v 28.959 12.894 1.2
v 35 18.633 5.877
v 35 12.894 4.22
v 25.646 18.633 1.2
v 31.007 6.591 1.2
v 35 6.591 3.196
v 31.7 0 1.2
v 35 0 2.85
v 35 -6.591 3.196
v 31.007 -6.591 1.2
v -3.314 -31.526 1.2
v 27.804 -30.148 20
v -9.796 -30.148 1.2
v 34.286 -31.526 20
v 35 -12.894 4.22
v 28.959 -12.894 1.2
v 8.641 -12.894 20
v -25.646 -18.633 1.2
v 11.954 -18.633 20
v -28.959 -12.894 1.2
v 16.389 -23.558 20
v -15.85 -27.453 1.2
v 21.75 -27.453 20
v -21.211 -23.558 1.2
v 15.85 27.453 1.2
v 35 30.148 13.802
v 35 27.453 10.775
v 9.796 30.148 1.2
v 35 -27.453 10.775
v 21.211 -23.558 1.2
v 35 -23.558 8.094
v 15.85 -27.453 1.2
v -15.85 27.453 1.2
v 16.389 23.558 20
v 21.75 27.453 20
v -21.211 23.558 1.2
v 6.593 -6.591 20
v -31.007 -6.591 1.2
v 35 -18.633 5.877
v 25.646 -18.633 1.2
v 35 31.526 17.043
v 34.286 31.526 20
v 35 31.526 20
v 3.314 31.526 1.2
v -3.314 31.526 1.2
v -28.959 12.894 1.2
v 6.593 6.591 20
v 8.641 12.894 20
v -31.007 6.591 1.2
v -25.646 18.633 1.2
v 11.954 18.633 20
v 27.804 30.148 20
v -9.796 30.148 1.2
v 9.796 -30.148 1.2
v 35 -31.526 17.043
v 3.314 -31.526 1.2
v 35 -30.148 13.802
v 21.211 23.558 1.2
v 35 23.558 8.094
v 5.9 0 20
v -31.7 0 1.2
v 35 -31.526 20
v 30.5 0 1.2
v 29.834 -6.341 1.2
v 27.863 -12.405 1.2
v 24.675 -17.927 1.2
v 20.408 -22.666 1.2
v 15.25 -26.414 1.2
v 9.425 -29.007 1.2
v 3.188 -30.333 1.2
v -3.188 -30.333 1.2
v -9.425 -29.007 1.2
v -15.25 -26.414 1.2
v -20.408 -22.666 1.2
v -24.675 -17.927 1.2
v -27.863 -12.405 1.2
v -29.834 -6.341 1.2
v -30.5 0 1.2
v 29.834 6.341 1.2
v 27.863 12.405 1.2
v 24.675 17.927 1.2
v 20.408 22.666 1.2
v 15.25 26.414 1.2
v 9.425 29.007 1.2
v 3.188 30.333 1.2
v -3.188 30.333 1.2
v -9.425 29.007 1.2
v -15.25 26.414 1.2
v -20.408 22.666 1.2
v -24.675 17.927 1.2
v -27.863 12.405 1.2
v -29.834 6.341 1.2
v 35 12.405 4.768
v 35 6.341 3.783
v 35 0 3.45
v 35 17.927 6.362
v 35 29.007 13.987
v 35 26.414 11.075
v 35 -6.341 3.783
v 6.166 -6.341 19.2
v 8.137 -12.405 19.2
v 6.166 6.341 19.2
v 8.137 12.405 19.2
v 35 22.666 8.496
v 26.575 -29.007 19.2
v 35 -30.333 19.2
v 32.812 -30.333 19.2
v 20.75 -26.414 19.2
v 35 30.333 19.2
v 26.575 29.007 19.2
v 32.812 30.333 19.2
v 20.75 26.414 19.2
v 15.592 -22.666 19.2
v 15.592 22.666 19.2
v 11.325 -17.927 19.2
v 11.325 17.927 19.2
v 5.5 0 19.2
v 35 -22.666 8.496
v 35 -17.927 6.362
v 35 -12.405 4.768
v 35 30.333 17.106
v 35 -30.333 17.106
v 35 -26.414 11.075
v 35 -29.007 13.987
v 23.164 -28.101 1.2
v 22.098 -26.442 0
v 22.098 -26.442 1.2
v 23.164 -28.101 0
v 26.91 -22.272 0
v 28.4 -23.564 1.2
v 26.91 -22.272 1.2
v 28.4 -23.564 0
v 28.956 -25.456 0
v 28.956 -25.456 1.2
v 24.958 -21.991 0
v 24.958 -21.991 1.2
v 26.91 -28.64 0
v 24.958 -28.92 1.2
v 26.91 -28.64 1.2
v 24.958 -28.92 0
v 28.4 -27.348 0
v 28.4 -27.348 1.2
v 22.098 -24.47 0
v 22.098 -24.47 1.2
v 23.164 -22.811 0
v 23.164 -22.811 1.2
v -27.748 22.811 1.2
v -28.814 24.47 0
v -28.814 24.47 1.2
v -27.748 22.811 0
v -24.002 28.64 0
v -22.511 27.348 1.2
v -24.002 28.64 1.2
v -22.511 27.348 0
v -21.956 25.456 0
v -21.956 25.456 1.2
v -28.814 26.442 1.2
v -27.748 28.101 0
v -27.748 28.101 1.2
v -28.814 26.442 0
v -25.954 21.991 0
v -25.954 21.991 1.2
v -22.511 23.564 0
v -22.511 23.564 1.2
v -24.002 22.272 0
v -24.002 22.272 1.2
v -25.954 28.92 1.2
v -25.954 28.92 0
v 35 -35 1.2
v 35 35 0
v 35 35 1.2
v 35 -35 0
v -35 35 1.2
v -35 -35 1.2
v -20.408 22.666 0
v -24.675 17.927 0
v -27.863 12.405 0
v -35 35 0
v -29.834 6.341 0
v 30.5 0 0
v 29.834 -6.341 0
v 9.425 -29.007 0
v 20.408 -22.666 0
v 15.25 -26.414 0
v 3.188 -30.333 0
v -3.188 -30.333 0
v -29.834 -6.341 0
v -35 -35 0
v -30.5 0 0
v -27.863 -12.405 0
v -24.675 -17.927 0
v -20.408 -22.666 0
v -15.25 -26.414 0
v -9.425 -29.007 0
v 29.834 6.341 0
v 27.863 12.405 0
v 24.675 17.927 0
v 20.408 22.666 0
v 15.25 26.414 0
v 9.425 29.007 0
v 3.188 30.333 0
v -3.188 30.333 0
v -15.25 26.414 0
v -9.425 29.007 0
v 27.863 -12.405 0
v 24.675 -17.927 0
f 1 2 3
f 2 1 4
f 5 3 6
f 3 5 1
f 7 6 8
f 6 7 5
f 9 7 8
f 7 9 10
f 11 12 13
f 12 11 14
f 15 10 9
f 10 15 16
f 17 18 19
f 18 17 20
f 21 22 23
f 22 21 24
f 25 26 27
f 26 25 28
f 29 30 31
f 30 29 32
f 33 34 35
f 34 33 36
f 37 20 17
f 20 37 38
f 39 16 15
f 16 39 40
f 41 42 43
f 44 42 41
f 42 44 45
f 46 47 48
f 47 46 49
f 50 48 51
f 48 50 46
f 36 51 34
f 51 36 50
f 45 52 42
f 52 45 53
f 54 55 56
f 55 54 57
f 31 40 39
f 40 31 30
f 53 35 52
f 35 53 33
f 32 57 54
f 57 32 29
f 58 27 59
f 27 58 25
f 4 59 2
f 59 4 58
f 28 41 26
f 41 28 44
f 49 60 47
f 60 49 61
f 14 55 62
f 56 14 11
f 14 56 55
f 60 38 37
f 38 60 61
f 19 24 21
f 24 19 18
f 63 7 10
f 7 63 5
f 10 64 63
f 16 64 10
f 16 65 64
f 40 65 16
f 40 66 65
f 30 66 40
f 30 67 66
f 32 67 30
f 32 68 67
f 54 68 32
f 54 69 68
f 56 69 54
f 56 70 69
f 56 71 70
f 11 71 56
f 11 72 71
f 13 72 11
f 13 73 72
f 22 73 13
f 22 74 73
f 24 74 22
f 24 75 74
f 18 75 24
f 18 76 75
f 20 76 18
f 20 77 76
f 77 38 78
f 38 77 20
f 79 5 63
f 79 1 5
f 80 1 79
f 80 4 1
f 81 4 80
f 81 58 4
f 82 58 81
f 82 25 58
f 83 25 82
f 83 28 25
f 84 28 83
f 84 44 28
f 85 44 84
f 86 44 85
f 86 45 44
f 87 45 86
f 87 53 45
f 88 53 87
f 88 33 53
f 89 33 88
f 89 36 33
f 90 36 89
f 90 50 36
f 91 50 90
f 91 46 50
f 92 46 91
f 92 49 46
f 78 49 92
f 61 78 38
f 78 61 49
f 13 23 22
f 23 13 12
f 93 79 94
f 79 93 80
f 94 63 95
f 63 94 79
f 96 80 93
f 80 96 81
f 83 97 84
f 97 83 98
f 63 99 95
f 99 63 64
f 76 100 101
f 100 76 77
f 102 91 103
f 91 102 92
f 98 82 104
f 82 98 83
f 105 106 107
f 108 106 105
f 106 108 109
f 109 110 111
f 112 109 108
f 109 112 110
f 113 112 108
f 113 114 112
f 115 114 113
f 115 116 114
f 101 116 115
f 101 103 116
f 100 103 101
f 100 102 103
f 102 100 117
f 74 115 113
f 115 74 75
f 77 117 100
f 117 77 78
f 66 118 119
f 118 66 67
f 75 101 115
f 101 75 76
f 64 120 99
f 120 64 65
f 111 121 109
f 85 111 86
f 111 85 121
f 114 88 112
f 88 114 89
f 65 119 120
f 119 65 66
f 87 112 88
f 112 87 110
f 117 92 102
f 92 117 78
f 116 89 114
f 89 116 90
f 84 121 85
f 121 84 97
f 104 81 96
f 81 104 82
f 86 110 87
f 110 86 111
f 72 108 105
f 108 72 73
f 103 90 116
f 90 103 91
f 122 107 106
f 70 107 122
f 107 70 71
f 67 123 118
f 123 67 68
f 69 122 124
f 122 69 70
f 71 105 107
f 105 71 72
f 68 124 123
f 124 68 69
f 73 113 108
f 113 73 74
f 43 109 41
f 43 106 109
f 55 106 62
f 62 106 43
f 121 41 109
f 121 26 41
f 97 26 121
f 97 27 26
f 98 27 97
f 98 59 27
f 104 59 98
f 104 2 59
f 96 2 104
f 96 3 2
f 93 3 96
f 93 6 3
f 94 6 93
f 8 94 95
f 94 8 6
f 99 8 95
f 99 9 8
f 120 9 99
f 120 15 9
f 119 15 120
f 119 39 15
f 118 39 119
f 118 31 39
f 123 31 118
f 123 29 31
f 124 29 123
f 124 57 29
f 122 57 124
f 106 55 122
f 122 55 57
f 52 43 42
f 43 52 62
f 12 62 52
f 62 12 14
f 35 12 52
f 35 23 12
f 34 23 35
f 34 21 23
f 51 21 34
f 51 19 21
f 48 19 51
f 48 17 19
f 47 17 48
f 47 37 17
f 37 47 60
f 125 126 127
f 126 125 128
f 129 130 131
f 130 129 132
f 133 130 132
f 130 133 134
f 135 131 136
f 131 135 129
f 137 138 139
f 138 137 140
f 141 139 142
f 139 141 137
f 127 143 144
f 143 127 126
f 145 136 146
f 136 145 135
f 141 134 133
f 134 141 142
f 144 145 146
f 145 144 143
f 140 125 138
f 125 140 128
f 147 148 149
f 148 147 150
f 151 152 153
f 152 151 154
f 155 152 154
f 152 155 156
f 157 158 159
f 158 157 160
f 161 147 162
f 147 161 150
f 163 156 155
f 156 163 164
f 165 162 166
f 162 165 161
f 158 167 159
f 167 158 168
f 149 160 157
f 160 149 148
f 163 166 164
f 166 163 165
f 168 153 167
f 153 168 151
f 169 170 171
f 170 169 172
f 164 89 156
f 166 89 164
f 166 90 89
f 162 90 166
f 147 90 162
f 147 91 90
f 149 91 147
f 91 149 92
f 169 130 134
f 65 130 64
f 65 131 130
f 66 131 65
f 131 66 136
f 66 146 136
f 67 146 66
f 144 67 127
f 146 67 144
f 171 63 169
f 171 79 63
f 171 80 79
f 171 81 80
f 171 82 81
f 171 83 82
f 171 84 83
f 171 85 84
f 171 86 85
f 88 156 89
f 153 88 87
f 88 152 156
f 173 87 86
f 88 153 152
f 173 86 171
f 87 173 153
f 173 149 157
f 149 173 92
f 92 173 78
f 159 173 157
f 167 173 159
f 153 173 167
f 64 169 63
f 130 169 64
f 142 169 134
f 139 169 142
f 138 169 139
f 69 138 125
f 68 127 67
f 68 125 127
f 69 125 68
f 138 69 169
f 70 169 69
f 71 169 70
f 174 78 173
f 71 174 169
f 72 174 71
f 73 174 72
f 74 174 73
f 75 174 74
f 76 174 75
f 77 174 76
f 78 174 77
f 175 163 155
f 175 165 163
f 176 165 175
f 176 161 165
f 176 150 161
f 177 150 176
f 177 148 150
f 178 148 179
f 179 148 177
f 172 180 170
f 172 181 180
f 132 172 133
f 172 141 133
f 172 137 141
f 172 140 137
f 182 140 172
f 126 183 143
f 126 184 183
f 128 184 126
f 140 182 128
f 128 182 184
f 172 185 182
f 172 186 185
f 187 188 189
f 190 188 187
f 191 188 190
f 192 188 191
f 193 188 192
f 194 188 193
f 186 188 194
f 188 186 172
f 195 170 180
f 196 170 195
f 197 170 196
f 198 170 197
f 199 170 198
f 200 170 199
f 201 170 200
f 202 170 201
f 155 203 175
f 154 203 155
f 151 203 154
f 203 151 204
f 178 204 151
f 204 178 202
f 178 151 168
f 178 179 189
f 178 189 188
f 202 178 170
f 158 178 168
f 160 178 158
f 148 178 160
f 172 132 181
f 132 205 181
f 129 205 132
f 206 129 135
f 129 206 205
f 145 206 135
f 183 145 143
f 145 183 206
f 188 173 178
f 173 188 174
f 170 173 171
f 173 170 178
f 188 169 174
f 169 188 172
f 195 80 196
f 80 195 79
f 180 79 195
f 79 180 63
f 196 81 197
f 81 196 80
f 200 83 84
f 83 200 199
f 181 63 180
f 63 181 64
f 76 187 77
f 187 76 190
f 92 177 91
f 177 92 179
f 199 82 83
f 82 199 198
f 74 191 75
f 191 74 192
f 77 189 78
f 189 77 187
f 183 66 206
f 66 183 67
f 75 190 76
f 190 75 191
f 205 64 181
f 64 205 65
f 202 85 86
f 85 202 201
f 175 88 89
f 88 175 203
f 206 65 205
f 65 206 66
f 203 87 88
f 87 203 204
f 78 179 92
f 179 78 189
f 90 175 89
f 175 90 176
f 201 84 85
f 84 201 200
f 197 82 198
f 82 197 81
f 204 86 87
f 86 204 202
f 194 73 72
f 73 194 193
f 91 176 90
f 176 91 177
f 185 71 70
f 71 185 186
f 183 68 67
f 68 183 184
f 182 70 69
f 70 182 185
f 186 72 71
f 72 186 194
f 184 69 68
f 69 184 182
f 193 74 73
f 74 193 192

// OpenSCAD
DIAMETER_IN = 61;
THICKNESS = 1.2;
SUPPORT_SIZE = 70;

M_DISTANCE = 72;
M_DIAMETER = 7;

RADIUS_IN = DIAMETER_IN / 2;
M_RADIUS = M_DIAMETER / 2;


//translate([0, 0, THICKNESS])
module shearedCylinder(shearingX=0, shearingY=0) {
    M = [[1, 0, shearingX, 0],
         [0, 1, shearingY, 0],
         [0, 0, 1, 0],
         [0, 0, 0, 1]];
    
    multmatrix(M) {
        difference() {
            cylinder(r=RADIUS_IN + THICKNESS, h=40, center=false);
            translate([0, 0, -1])
            cylinder(r=RADIUS_IN, h=19, center=false);
        }
    }
}

module main() {
    difference() {
        translate([0, 0, THICKNESS])
        shearedCylinder(2);
        translate([SUPPORT_SIZE/2, -SUPPORT_SIZE/2, 0])
        cube([SUPPORT_SIZE*2, SUPPORT_SIZE, 50], center=false);
        
        translate([-SUPPORT_SIZE/2, -SUPPORT_SIZE/2, 20])
        cube([SUPPORT_SIZE*2, SUPPORT_SIZE*2, SUPPORT_SIZE], center=false);
    }
}

module bolt_hole() {
    translate([0, 0, -1])
        cylinder(r=M_RADIUS, h=THICKNESS+2, center=false);
    
    
}

module bolt_holes() {
    m = M_DISTANCE / 2;
    shift = sqrt(m * m / 2);
    
    translate([shift, -shift, 0]) bolt_hole();
    translate([-shift, shift, 0]) bolt_hole();
}

module support() {
    difference() {
        translate([-SUPPORT_SIZE/2, -SUPPORT_SIZE/2, 0])
        cube([SUPPORT_SIZE, SUPPORT_SIZE, THICKNESS], center=false);
        translate([0, 0, -1])
        cylinder(r=RADIUS_IN, h=THICKNESS+2, center=false);
        bolt_holes();
    }
}

union() {
    main();
    support();
}
